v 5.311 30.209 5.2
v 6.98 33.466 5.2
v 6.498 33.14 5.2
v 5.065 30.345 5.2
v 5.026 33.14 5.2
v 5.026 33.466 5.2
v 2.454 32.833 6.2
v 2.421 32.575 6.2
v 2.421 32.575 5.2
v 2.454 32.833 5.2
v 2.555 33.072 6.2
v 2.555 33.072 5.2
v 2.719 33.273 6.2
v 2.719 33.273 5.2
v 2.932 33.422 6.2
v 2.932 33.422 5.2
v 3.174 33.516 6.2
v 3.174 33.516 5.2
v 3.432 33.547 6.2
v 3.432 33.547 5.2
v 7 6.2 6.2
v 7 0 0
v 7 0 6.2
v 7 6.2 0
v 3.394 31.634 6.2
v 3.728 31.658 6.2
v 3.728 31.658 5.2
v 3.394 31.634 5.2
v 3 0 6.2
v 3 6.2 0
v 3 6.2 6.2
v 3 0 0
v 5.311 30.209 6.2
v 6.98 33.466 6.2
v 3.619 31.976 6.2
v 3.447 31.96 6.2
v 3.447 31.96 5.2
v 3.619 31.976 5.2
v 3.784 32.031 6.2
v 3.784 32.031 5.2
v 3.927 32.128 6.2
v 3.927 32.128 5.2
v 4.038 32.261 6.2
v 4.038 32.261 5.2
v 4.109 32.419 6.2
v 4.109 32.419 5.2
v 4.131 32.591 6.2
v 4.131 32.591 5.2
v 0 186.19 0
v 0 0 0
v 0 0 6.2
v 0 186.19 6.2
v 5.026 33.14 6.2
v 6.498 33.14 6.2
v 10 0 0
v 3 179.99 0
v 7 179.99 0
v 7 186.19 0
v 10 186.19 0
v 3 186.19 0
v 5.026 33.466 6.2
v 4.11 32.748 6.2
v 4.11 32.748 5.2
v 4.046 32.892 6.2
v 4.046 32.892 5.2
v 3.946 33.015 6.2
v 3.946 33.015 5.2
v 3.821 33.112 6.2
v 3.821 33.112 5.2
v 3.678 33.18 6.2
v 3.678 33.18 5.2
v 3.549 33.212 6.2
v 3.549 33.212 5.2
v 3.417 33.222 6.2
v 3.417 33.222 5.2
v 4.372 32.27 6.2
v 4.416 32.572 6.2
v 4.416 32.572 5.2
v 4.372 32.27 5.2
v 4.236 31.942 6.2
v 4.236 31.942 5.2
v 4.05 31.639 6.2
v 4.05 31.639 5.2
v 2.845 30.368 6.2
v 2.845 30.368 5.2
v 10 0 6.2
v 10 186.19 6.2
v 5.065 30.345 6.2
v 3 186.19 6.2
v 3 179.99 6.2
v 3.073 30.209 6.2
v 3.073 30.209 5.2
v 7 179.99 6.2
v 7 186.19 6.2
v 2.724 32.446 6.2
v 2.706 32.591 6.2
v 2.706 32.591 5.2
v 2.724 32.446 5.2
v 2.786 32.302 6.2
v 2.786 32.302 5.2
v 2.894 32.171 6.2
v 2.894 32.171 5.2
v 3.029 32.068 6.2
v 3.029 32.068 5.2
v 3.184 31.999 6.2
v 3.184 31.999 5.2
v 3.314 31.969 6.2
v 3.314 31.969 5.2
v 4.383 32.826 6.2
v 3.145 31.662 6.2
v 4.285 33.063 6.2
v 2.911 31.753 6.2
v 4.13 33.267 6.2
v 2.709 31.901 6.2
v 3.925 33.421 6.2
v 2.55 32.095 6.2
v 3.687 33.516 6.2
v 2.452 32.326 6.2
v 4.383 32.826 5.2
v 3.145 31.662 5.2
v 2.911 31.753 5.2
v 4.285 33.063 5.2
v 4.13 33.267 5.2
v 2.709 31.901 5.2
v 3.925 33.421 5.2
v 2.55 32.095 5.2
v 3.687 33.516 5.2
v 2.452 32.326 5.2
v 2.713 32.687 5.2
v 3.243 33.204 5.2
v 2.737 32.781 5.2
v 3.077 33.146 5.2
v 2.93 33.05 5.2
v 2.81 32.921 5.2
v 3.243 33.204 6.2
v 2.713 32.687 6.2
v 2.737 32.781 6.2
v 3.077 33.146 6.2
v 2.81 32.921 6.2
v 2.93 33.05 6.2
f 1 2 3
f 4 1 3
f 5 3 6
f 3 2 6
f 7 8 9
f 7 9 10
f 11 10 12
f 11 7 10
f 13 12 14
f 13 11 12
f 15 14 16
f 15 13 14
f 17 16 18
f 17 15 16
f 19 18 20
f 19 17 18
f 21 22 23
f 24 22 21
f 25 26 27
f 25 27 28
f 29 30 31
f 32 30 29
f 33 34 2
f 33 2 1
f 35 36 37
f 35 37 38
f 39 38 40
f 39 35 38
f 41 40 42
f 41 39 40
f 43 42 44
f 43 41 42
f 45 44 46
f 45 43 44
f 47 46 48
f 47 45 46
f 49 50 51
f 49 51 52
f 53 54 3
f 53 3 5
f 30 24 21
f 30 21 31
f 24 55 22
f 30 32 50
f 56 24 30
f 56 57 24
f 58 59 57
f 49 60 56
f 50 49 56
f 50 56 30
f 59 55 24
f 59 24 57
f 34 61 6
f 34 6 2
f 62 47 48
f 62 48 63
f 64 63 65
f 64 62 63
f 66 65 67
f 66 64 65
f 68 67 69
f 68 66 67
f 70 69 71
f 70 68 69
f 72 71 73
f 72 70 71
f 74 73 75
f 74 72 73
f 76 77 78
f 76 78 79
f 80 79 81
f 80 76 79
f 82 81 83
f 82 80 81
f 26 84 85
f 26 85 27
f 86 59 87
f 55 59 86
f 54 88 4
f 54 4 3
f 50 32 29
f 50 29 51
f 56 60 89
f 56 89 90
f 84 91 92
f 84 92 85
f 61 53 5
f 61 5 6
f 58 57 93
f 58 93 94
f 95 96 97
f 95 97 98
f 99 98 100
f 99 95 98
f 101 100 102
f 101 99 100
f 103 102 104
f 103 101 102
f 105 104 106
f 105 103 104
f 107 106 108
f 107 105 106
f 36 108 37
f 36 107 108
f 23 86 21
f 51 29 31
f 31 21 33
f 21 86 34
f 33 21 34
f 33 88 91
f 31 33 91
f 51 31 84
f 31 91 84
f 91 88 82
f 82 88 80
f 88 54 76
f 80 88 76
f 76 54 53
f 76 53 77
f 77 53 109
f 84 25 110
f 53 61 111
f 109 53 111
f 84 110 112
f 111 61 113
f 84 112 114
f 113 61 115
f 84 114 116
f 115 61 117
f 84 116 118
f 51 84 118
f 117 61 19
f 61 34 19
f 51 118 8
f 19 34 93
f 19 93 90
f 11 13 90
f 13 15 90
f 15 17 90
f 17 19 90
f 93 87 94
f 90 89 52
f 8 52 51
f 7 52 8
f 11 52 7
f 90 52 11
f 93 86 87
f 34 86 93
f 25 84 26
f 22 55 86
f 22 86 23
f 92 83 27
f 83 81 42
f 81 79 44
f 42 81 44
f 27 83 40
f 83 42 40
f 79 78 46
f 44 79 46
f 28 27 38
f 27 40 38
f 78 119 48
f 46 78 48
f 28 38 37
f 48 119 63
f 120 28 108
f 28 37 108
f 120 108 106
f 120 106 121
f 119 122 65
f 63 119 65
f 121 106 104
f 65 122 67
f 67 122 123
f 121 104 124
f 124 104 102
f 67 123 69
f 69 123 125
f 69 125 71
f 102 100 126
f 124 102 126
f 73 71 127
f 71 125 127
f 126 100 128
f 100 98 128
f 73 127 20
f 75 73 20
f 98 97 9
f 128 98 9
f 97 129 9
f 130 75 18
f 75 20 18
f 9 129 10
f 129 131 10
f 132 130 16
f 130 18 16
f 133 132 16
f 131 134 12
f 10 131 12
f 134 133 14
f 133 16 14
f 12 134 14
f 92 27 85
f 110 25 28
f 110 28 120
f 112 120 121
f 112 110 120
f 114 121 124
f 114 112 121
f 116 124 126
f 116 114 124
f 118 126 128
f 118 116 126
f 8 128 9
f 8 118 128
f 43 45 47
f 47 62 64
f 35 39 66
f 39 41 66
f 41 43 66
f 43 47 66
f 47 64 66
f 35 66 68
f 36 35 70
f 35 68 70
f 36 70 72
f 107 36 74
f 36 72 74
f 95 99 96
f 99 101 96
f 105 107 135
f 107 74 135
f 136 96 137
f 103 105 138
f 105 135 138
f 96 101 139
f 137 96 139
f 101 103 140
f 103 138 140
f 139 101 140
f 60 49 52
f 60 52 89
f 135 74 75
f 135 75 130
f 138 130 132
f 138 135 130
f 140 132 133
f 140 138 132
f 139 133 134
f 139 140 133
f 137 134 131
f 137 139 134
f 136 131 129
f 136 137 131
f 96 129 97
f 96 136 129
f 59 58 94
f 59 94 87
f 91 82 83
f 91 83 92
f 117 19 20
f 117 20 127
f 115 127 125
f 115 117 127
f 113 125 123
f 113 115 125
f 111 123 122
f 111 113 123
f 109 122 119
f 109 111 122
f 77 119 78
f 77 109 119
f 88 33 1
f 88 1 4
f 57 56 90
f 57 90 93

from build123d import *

# Parameters (mm, degrees)
BOSS_EXTRUDE1_DEPTH = 6.2
CUT_EXTRUDE1_DEPTH  = 1


with BuildPart() as part:
    # Sketch2 → Boss-Extrude1 (new body)
    with BuildSketch(Plane.XY):
        Polygon((0, 0), (0, 186.19), (3, 186.19), (3, 179.99), (7, 179.99), (7, 186.19), (10, 186.19), (10, 0), (7, 0), (7, 6.2), (3, 6.2), (3, 0), align=None)
    extrude(amount=BOSS_EXTRUDE1_DEPTH)

    # Sketch3 → Cut-Extrude1 (cut)
    with BuildSketch(Plane.XY.offset(6.2)):
        with BuildLine():
            Line((3.072648213, 30.209362795), (2.844953902, 30.367731185))
            Line((2.844953902, 30.367731185), (3.72774637, 31.658210953))
            add(Edge.make_bspline(
                [(3.72774637, 31.658210953), (3.671421203, 31.651322959), (3.560513808, 31.637760117), (3.448810866, 31.635268509), (3.393837115, 31.634042283)],
                knots=[0, 0, 0, 0, 0.000170115, 0.000334967, 0.000334967, 0.000334967, 0.000334967], degree=3))
            add(Edge.make_bspline(
                [(3.393837115, 31.634042283), (3.360506829, 31.634895973), (3.295082392, 31.636571694), (3.198896536, 31.649853906), (3.106471777, 31.670310093), (3.018053147, 31.700834321), (2.933308311, 31.73876941), (2.852422271, 31.78581113), (2.775503913, 31.841152552), (2.703379334, 31.904501051), (2.637782256, 31.974058999), (2.579341122, 32.04767876), (2.530771667, 32.126215534), (2.49042505, 32.208067233), (2.45982671, 32.294410316), (2.437544979, 32.384262271), (2.423826844, 32.478252832), (2.422194807, 32.542229201), (2.421366162, 32.574712355)],
                knots=[0, 0, 0, 0, 9.9954e-05, 0.000196201, 0.000290782, 0.000383503, 0.000476303, 0.000568919, 0.000663705, 0.000760153, 0.000856434, 0.000950205, 0.001041624, 0.001132931, 0.001223461, 0.001315861, 0.001410305, 0.001507717, 0.001507717, 0.001507717, 0.001507717], degree=3))
            add(Edge.make_bspline(
                [(2.421366162, 32.574712355), (2.422939542, 32.619133918), (2.426027768, 32.706324436), (2.450882137, 32.833717927), (2.491758302, 32.954174291), (2.548752615, 33.067376824), (2.620539113, 33.171697109), (2.706816191, 33.265684919), (2.807059073, 33.348003465), (2.91898419, 33.418764307), (3.03995443, 33.475673911), (3.166653856, 33.517619562), (3.298111665, 33.542292712), (3.387163766, 33.5455456), (3.431998173, 33.547183308)],
                knots=[0, 0, 0, 0, 0.000133185, 0.000261414, 0.000387724, 0.00051373, 0.000640399, 0.00076644, 0.000895188, 0.001028407, 0.001162697, 0.001295241, 0.001427846, 0.0015623, 0.0015623, 0.0015623, 0.0015623], degree=3))
            add(Edge.make_bspline(
                [(3.431998173, 33.547183308), (3.475984097, 33.545523089), (3.562896136, 33.542242652), (3.690702591, 33.518217909), (3.813113371, 33.47772607), (3.929449895, 33.421769358), (4.037163504, 33.351628249), (4.134024419, 33.268049074), (4.217822229, 33.170979774), (4.288419607, 33.062768073), (4.345088858, 32.946502311), (4.385975857, 32.825141182), (4.411145116, 32.699557484), (4.414316784, 32.614472497), (4.415917444, 32.571532267)],
                knots=[0, 0, 0, 0, 0.000131915, 0.000260652, 0.000388569, 0.000517718, 0.000646848, 0.000773094, 0.000900237, 0.001030248, 0.001159674, 0.001287189, 0.001413545, 0.001542287, 0.001542287, 0.001542287, 0.001542287], degree=3))
            add(Edge.make_bspline(
                [(4.415917444, 32.571532267), (4.414848459, 32.538200421), (4.41268029, 32.470595109), (4.397498068, 32.367879012), (4.3717169, 32.263148254), (4.342460002, 32.174500806), (4.314218678, 32.101286713), (4.287638366, 32.043454922), (4.258145198, 31.982584491), (4.223747461, 31.919313691), (4.186770235, 31.852835963), (4.144987891, 31.783818071), (4.099353551, 31.712167398), (4.066850877, 31.663864683), (4.050207308, 31.639130424)],
                knots=[0, 0, 0, 0, 9.9984e-05, 0.000202793, 0.000310776, 0.000423207, 0.000482616, 0.000546097, 0.000614079, 0.0006855, 0.000762103, 0.000842274, 0.000927493, 0.001016928, 0.001016928, 0.001016928, 0.001016928], degree=3))
            Line((4.050207308, 31.639130424), (3.072648213, 30.209362795))
        make_face()
        with BuildLine():
            add(Edge.make_bspline(
                [(3.446626579, 31.959683308), (3.471876006, 31.960373085), (3.521028056, 31.961715846), (3.593034606, 31.969888515), (3.661001562, 31.984379203), (3.725110481, 32.005170656), (3.786004171, 32.030259205), (3.842715411, 32.062201507), (3.895291665, 32.100316597), (3.944084999, 32.143142826), (3.98741377, 32.190722998), (4.026006377, 32.240522516), (4.058809177, 32.292759984), (4.08472015, 32.348089586), (4.106024015, 32.405164482), (4.120736069, 32.46490379), (4.128886142, 32.526996268), (4.1302755, 32.569177193), (4.130981547, 32.590612795)],
                knots=[0, 0, 0, 0, 7.5753e-05, 0.000147465, 0.000217073, 0.000283852, 0.000349411, 0.000414338, 0.000478589, 0.000543925, 0.000608743, 0.000671332, 0.000732749, 0.000793345, 0.000854313, 0.000915245, 0.00097749, 0.001041807, 0.001041807, 0.001041807, 0.001041807], degree=3))
            add(Edge.make_bspline(
                [(4.130981547, 32.590612795), (4.130374061, 32.612057349), (4.129176936, 32.654316472), (4.119572743, 32.716500879), (4.102677005, 32.776094051), (4.080007065, 32.833422241), (4.050143706, 32.888014436), (4.014308401, 32.940556034), (3.971733965, 32.990713892), (3.922745923, 33.037308363), (3.869918864, 33.080259672), (3.813621124, 33.118165612), (3.754316736, 33.14993484), (3.692367506, 33.176150334), (3.627644361, 33.196608017), (3.5601856, 33.211319483), (3.48965034, 33.219458146), (3.441770173, 33.220838722), (3.417369768, 33.221542283)],
                knots=[0, 0, 0, 0, 6.4316e-05, 0.000126743, 0.000188161, 0.000249812, 0.000311283, 0.000374438, 0.00044032, 0.000508243, 0.00057698, 0.000644365, 0.000711521, 0.0007785, 0.000845884, 0.000914871, 0.00098532, 0.001058531, 0.001058531, 0.001058531, 0.001058531], degree=3))
            add(Edge.make_bspline(
                [(3.417369768, 33.221542283), (3.393181571, 33.220837585), (3.34572453, 33.219454975), (3.275816328, 33.211334953), (3.208813697, 33.196509078), (3.144278084, 33.17615981), (3.082330695, 33.149932885), (3.023029104, 33.118163947), (2.966718196, 33.080268397), (2.913941785, 33.037274568), (2.864867241, 32.990930775), (2.823024797, 32.940336307), (2.787107481, 32.888041767), (2.757285157, 32.833414977), (2.734604302, 32.77609599), (2.717711486, 32.716500354), (2.708106508, 32.654316609), (2.70690949, 32.612057395), (2.706302059, 32.590612795)],
                knots=[0, 0, 0, 0, 7.2576e-05, 0.000142393, 0.000210758, 0.000278143, 0.000345121, 0.000412278, 0.000479663, 0.0005484, 0.000616323, 0.000681795, 0.00074495, 0.000806421, 0.000868072, 0.00092949, 0.000991917, 0.001056233, 0.001056233, 0.001056233, 0.001056233], degree=3))
            add(Edge.make_bspline(
                [(2.706302059, 32.590612795), (2.706851721, 32.569160501), (2.707935754, 32.52685265), (2.718393106, 32.464689422), (2.73588126, 32.405100846), (2.759303136, 32.347507519), (2.790147435, 32.292469476), (2.827996926, 32.240247655), (2.872361243, 32.190250068), (2.922647335, 32.143253526), (2.977682024, 32.100116909), (3.036461929, 32.06244292), (3.097975139, 32.030627203), (3.162438189, 32.005098947), (3.229373358, 31.984586938), (3.299382227, 31.969915222), (3.372233271, 31.961794237), (3.421590897, 31.960393702), (3.446626579, 31.959683308)],
                knots=[0, 0, 0, 0, 6.4316e-05, 0.000126844, 0.000188436, 0.000250326, 0.000312966, 0.000377217, 0.000443451, 0.000513196, 0.000583426, 0.000652939, 0.000722346, 0.000790847, 0.000860662, 0.000932137, 0.001005113, 0.00108023, 0.00108023, 0.00108023, 0.00108023], degree=3))
        make_face(mode=Mode.SUBTRACT)
        Polygon((5.026494367, 33.465773052), (6.980340521, 33.465773052), (5.311430264, 30.209362795), (5.065291442, 30.34483455), (6.498239159, 33.140132026), (5.026494367, 33.140132026), align=None)
    extrude(amount=-CUT_EXTRUDE1_DEPTH, mode=Mode.SUBTRACT)


solid = part.part
